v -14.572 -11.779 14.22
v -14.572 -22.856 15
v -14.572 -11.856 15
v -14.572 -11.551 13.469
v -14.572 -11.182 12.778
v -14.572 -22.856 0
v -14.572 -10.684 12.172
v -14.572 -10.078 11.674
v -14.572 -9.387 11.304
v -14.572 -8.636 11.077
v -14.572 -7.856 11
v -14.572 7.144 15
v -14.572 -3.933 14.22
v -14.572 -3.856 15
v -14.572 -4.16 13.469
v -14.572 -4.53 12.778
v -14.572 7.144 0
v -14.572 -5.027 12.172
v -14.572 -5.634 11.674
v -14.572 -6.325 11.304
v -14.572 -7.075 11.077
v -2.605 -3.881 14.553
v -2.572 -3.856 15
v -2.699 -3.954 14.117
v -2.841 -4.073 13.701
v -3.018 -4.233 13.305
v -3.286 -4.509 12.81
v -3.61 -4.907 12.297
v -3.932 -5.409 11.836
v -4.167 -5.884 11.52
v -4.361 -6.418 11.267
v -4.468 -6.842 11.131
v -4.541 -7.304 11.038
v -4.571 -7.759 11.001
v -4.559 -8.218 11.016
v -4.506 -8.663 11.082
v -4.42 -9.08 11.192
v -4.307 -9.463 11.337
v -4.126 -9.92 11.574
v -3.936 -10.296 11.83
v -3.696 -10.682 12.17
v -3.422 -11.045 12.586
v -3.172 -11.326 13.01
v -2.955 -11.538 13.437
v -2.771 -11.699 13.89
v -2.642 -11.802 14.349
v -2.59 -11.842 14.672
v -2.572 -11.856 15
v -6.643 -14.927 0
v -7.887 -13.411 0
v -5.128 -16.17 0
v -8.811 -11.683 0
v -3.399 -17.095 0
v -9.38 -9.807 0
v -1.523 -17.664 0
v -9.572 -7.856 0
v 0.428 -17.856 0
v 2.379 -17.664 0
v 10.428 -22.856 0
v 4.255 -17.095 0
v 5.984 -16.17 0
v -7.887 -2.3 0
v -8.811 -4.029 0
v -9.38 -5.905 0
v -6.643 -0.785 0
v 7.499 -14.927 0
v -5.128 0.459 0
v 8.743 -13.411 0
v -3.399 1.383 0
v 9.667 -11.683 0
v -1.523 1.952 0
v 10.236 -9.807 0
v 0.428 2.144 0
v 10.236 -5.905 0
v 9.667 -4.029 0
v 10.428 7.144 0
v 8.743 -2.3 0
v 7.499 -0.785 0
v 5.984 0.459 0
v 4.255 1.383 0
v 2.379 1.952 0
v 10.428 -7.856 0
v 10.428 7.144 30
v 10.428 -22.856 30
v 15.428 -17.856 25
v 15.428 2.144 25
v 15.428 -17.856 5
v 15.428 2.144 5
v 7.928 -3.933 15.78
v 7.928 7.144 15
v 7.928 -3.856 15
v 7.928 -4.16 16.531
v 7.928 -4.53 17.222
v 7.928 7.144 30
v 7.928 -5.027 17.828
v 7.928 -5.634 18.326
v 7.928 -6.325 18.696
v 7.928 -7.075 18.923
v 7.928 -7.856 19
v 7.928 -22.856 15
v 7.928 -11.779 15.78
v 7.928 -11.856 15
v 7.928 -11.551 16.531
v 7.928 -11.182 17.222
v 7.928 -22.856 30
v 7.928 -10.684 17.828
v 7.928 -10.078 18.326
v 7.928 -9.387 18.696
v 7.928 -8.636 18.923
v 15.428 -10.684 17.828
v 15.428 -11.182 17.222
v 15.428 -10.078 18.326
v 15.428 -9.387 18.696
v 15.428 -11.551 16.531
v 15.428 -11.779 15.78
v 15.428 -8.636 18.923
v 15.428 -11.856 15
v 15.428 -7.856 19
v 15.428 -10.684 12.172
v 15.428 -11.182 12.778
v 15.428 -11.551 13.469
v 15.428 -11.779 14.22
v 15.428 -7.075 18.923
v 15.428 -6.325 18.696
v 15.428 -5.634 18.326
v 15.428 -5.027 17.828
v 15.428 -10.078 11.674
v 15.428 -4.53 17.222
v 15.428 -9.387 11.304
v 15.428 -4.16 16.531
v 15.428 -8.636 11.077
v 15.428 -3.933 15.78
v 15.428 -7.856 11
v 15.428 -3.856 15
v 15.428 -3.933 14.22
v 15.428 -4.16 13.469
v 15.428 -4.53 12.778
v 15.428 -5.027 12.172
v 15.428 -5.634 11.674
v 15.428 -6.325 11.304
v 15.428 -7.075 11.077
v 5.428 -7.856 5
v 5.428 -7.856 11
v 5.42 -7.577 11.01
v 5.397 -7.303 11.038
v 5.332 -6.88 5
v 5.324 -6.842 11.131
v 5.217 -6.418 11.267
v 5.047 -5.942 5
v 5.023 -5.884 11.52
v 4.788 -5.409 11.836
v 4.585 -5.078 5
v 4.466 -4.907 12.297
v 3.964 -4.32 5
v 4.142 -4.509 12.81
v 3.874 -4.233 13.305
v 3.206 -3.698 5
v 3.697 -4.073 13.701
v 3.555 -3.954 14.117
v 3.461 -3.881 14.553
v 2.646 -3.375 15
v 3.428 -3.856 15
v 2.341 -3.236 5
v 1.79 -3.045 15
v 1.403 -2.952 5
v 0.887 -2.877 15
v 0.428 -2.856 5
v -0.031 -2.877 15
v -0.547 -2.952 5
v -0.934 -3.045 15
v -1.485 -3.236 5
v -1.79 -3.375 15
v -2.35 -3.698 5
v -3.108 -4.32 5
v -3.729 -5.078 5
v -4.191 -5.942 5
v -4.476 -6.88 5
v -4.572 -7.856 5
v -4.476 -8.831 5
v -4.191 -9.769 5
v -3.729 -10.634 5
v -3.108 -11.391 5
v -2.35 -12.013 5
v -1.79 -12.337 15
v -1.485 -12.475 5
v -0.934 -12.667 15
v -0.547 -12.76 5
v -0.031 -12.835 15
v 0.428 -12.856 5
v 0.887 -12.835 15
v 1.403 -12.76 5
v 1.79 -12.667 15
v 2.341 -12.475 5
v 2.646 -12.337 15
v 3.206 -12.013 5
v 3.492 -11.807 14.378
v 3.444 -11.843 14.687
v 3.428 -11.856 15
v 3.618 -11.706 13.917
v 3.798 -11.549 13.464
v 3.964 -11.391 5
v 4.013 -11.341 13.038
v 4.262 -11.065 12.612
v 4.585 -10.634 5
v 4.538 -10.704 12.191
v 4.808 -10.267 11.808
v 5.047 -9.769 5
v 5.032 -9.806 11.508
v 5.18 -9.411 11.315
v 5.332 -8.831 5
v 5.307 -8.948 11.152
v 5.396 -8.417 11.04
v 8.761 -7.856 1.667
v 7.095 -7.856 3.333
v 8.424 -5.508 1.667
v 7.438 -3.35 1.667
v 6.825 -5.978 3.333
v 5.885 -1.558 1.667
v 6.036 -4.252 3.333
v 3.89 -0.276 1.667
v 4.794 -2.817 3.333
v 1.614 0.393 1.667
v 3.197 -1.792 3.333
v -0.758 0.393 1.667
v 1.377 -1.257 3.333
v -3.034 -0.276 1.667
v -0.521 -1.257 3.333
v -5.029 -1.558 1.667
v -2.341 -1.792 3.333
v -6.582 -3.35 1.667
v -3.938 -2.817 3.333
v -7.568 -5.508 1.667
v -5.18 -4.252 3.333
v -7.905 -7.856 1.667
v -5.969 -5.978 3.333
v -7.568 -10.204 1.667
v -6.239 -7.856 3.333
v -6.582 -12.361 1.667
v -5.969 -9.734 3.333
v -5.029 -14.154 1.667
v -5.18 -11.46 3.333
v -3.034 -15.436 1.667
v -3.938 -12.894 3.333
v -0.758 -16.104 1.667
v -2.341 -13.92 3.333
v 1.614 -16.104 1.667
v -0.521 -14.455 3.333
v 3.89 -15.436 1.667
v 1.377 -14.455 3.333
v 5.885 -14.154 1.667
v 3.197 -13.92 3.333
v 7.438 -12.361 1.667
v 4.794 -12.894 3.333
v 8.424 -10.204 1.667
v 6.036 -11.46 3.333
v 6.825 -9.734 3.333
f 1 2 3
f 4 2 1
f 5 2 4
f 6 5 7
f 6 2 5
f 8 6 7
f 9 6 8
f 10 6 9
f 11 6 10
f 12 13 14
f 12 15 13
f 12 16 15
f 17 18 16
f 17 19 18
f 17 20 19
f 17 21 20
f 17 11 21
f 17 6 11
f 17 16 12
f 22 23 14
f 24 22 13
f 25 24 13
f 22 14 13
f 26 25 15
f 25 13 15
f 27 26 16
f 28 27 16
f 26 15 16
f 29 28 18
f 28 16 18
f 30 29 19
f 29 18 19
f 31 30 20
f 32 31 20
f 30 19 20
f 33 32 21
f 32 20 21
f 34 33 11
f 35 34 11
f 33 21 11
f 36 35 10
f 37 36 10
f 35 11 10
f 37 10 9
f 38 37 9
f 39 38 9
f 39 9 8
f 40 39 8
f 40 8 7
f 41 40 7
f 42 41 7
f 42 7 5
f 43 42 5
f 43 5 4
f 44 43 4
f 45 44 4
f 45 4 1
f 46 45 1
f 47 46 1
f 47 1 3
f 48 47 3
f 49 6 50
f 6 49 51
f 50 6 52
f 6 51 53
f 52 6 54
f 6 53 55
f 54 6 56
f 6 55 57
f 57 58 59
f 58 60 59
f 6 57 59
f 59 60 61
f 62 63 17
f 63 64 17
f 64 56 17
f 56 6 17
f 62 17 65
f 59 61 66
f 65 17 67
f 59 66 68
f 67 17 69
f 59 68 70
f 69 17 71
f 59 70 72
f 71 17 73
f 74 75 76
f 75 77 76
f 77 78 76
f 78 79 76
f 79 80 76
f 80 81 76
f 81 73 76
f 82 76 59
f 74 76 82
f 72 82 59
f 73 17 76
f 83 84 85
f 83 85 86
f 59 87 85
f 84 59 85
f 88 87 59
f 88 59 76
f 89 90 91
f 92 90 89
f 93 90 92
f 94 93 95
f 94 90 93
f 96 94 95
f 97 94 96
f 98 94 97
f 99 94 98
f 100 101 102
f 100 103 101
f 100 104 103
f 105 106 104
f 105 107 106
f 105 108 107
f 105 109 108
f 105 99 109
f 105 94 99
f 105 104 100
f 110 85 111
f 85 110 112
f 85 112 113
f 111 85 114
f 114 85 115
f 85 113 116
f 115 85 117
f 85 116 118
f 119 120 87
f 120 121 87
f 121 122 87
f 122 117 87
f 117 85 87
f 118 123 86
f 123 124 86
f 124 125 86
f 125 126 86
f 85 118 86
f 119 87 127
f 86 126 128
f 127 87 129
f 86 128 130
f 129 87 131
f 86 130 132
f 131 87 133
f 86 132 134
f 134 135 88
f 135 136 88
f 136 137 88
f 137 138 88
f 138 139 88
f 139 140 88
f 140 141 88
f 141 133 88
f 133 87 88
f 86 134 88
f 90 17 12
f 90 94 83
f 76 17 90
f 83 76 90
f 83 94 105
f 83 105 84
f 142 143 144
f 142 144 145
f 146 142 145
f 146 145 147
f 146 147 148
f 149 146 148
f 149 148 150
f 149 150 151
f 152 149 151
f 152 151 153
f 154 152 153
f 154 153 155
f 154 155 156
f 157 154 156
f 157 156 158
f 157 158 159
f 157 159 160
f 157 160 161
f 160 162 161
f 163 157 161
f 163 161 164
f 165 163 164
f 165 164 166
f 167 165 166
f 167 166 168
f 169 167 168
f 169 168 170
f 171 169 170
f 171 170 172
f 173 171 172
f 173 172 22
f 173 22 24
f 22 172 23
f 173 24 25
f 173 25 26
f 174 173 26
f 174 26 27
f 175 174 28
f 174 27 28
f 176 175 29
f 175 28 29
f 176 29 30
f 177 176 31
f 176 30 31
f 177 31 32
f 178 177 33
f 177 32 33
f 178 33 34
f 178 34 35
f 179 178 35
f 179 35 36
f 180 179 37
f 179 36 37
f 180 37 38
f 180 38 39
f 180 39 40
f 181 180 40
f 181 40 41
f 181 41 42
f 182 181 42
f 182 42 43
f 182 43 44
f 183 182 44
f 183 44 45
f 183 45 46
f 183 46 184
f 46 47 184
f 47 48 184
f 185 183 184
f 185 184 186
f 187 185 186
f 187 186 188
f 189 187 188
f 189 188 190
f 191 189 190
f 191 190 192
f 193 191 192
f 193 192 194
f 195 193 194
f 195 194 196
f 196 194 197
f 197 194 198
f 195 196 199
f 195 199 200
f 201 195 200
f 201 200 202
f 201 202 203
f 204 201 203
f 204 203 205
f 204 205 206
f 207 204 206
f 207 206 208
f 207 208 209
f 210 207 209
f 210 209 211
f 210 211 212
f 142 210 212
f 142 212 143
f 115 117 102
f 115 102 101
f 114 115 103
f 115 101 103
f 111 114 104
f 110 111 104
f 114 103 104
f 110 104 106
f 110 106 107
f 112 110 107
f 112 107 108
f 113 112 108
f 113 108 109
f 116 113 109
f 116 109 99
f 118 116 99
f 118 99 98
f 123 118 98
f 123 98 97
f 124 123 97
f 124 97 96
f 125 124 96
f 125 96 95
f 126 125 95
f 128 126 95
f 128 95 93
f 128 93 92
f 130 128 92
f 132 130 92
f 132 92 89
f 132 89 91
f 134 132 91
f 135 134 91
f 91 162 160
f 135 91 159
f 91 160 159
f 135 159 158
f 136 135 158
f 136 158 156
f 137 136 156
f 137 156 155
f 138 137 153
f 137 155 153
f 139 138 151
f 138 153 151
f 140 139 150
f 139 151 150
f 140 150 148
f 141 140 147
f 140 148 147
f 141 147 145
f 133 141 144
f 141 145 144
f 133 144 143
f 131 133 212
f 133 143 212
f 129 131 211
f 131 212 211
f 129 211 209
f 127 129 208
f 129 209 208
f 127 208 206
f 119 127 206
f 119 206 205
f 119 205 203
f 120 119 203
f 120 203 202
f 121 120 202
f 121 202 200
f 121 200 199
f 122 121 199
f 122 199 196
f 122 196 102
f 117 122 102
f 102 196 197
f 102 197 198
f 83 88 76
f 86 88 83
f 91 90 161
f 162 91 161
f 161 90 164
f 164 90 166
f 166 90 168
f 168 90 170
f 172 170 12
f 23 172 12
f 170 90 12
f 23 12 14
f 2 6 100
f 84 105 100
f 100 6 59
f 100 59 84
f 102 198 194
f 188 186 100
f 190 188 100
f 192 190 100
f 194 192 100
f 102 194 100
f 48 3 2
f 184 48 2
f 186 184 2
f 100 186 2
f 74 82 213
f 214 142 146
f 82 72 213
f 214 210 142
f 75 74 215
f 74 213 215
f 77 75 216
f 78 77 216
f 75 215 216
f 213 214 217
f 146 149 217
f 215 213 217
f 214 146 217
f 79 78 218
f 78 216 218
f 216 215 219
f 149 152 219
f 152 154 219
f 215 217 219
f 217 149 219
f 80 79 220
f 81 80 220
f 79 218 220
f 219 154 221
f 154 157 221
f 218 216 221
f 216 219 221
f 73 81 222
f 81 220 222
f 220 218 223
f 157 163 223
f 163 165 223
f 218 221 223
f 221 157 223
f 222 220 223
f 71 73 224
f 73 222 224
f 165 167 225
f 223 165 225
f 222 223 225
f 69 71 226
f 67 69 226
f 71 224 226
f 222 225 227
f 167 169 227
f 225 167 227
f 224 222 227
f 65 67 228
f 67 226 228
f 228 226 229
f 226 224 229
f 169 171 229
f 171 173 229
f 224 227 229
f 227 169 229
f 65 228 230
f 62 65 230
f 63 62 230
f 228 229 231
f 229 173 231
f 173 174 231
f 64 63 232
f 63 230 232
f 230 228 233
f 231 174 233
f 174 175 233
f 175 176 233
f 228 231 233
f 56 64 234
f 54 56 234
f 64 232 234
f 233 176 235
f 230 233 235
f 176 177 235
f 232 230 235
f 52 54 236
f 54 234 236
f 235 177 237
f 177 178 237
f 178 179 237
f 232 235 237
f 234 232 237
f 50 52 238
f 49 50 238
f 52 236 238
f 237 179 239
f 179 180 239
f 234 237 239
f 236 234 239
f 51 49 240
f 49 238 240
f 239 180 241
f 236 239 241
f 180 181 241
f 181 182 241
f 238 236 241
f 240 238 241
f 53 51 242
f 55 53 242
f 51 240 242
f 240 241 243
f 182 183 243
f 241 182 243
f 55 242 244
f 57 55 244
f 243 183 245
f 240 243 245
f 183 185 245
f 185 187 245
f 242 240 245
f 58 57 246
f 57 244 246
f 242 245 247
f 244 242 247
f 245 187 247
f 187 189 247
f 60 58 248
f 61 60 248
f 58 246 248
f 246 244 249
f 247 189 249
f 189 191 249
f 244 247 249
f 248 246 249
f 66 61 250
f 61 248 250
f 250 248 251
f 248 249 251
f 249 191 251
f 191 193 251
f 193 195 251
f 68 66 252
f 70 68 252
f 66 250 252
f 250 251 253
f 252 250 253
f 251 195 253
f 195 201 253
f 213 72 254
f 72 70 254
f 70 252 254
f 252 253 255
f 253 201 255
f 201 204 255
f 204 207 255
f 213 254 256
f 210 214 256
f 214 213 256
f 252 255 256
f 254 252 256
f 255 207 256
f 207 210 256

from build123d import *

# Parameters (mm, degrees)
F0_W     = 30
F0_H     = 30
F1_DEPTH = 30
F2_R     = 4
F3_DEPTH = 30.001
F4_R     = 5
F5_DEPTH = 30.001
F6_W     = 30
F6_H     = 15
F7_DEPTH = 22.5
F8_SIZE  = 5
F9_SIZE  = 4.99999


# Not quite as in the source:
# - a fillet or chamfer is up to 0.001 mm smaller than in the source, because OpenCascade refuses the exact size


with BuildPart() as f1:
    # F0 (on Top) → F1 (new body)
    with BuildSketch(Plane.XY):
        with Locations((0.4279911518, -7.855784721)):
            Rectangle(F0_W, F0_H)
    extrude(amount=F1_DEPTH)

    # F2 (on face) → F3 (cut, through all)
    with BuildSketch(Plane(origin=(-14.5720088482, 0, 0), x_dir=(0, -1, 0), z_dir=(-1, 0, 0))):
        with Locations((7.855784721, 15)):
            Circle(F2_R)
    extrude(amount=-F3_DEPTH, mode=Mode.SUBTRACT)

    # F4 (on face) → F5 (cut, through all)
    with BuildSketch(Plane.XY.offset(30)):
        with Locations((0.4279911518, -7.855784721)):
            Circle(F4_R)
    extrude(amount=-F5_DEPTH, mode=Mode.SUBTRACT)

    # F6 (on face) → F7 (cut)
    with BuildSketch(Plane(origin=(-14.5720088482, 0, 0), x_dir=(0, -1, 0), z_dir=(-1, 0, 0))):
        with Locations((7.855784721, 22.5)):
            Rectangle(F6_W, F6_H)
    extrude(amount=-F7_DEPTH, mode=Mode.SUBTRACT)

    # F8
    f8_edges = [f1.edges().sort_by_distance(p)[0] for p in [
        (-4.572009, -7.855785, 0),
    ]]
    chamfer(f8_edges, length=F8_SIZE)

    # F9 (size 5 in the source; OpenCascade refuses exactly that, so slightly less here)
    f9_edges = [f1.edges().sort_by_distance(p)[0] for p in [
        (15.427991, -7.855785, 30),
        (15.427991, -22.855785, 15),
        (15.427991, 7.144215, 15),
        (15.427991, -7.855785, 0),
    ]]
    chamfer(f9_edges, length=F9_SIZE)


solid = f1.part
